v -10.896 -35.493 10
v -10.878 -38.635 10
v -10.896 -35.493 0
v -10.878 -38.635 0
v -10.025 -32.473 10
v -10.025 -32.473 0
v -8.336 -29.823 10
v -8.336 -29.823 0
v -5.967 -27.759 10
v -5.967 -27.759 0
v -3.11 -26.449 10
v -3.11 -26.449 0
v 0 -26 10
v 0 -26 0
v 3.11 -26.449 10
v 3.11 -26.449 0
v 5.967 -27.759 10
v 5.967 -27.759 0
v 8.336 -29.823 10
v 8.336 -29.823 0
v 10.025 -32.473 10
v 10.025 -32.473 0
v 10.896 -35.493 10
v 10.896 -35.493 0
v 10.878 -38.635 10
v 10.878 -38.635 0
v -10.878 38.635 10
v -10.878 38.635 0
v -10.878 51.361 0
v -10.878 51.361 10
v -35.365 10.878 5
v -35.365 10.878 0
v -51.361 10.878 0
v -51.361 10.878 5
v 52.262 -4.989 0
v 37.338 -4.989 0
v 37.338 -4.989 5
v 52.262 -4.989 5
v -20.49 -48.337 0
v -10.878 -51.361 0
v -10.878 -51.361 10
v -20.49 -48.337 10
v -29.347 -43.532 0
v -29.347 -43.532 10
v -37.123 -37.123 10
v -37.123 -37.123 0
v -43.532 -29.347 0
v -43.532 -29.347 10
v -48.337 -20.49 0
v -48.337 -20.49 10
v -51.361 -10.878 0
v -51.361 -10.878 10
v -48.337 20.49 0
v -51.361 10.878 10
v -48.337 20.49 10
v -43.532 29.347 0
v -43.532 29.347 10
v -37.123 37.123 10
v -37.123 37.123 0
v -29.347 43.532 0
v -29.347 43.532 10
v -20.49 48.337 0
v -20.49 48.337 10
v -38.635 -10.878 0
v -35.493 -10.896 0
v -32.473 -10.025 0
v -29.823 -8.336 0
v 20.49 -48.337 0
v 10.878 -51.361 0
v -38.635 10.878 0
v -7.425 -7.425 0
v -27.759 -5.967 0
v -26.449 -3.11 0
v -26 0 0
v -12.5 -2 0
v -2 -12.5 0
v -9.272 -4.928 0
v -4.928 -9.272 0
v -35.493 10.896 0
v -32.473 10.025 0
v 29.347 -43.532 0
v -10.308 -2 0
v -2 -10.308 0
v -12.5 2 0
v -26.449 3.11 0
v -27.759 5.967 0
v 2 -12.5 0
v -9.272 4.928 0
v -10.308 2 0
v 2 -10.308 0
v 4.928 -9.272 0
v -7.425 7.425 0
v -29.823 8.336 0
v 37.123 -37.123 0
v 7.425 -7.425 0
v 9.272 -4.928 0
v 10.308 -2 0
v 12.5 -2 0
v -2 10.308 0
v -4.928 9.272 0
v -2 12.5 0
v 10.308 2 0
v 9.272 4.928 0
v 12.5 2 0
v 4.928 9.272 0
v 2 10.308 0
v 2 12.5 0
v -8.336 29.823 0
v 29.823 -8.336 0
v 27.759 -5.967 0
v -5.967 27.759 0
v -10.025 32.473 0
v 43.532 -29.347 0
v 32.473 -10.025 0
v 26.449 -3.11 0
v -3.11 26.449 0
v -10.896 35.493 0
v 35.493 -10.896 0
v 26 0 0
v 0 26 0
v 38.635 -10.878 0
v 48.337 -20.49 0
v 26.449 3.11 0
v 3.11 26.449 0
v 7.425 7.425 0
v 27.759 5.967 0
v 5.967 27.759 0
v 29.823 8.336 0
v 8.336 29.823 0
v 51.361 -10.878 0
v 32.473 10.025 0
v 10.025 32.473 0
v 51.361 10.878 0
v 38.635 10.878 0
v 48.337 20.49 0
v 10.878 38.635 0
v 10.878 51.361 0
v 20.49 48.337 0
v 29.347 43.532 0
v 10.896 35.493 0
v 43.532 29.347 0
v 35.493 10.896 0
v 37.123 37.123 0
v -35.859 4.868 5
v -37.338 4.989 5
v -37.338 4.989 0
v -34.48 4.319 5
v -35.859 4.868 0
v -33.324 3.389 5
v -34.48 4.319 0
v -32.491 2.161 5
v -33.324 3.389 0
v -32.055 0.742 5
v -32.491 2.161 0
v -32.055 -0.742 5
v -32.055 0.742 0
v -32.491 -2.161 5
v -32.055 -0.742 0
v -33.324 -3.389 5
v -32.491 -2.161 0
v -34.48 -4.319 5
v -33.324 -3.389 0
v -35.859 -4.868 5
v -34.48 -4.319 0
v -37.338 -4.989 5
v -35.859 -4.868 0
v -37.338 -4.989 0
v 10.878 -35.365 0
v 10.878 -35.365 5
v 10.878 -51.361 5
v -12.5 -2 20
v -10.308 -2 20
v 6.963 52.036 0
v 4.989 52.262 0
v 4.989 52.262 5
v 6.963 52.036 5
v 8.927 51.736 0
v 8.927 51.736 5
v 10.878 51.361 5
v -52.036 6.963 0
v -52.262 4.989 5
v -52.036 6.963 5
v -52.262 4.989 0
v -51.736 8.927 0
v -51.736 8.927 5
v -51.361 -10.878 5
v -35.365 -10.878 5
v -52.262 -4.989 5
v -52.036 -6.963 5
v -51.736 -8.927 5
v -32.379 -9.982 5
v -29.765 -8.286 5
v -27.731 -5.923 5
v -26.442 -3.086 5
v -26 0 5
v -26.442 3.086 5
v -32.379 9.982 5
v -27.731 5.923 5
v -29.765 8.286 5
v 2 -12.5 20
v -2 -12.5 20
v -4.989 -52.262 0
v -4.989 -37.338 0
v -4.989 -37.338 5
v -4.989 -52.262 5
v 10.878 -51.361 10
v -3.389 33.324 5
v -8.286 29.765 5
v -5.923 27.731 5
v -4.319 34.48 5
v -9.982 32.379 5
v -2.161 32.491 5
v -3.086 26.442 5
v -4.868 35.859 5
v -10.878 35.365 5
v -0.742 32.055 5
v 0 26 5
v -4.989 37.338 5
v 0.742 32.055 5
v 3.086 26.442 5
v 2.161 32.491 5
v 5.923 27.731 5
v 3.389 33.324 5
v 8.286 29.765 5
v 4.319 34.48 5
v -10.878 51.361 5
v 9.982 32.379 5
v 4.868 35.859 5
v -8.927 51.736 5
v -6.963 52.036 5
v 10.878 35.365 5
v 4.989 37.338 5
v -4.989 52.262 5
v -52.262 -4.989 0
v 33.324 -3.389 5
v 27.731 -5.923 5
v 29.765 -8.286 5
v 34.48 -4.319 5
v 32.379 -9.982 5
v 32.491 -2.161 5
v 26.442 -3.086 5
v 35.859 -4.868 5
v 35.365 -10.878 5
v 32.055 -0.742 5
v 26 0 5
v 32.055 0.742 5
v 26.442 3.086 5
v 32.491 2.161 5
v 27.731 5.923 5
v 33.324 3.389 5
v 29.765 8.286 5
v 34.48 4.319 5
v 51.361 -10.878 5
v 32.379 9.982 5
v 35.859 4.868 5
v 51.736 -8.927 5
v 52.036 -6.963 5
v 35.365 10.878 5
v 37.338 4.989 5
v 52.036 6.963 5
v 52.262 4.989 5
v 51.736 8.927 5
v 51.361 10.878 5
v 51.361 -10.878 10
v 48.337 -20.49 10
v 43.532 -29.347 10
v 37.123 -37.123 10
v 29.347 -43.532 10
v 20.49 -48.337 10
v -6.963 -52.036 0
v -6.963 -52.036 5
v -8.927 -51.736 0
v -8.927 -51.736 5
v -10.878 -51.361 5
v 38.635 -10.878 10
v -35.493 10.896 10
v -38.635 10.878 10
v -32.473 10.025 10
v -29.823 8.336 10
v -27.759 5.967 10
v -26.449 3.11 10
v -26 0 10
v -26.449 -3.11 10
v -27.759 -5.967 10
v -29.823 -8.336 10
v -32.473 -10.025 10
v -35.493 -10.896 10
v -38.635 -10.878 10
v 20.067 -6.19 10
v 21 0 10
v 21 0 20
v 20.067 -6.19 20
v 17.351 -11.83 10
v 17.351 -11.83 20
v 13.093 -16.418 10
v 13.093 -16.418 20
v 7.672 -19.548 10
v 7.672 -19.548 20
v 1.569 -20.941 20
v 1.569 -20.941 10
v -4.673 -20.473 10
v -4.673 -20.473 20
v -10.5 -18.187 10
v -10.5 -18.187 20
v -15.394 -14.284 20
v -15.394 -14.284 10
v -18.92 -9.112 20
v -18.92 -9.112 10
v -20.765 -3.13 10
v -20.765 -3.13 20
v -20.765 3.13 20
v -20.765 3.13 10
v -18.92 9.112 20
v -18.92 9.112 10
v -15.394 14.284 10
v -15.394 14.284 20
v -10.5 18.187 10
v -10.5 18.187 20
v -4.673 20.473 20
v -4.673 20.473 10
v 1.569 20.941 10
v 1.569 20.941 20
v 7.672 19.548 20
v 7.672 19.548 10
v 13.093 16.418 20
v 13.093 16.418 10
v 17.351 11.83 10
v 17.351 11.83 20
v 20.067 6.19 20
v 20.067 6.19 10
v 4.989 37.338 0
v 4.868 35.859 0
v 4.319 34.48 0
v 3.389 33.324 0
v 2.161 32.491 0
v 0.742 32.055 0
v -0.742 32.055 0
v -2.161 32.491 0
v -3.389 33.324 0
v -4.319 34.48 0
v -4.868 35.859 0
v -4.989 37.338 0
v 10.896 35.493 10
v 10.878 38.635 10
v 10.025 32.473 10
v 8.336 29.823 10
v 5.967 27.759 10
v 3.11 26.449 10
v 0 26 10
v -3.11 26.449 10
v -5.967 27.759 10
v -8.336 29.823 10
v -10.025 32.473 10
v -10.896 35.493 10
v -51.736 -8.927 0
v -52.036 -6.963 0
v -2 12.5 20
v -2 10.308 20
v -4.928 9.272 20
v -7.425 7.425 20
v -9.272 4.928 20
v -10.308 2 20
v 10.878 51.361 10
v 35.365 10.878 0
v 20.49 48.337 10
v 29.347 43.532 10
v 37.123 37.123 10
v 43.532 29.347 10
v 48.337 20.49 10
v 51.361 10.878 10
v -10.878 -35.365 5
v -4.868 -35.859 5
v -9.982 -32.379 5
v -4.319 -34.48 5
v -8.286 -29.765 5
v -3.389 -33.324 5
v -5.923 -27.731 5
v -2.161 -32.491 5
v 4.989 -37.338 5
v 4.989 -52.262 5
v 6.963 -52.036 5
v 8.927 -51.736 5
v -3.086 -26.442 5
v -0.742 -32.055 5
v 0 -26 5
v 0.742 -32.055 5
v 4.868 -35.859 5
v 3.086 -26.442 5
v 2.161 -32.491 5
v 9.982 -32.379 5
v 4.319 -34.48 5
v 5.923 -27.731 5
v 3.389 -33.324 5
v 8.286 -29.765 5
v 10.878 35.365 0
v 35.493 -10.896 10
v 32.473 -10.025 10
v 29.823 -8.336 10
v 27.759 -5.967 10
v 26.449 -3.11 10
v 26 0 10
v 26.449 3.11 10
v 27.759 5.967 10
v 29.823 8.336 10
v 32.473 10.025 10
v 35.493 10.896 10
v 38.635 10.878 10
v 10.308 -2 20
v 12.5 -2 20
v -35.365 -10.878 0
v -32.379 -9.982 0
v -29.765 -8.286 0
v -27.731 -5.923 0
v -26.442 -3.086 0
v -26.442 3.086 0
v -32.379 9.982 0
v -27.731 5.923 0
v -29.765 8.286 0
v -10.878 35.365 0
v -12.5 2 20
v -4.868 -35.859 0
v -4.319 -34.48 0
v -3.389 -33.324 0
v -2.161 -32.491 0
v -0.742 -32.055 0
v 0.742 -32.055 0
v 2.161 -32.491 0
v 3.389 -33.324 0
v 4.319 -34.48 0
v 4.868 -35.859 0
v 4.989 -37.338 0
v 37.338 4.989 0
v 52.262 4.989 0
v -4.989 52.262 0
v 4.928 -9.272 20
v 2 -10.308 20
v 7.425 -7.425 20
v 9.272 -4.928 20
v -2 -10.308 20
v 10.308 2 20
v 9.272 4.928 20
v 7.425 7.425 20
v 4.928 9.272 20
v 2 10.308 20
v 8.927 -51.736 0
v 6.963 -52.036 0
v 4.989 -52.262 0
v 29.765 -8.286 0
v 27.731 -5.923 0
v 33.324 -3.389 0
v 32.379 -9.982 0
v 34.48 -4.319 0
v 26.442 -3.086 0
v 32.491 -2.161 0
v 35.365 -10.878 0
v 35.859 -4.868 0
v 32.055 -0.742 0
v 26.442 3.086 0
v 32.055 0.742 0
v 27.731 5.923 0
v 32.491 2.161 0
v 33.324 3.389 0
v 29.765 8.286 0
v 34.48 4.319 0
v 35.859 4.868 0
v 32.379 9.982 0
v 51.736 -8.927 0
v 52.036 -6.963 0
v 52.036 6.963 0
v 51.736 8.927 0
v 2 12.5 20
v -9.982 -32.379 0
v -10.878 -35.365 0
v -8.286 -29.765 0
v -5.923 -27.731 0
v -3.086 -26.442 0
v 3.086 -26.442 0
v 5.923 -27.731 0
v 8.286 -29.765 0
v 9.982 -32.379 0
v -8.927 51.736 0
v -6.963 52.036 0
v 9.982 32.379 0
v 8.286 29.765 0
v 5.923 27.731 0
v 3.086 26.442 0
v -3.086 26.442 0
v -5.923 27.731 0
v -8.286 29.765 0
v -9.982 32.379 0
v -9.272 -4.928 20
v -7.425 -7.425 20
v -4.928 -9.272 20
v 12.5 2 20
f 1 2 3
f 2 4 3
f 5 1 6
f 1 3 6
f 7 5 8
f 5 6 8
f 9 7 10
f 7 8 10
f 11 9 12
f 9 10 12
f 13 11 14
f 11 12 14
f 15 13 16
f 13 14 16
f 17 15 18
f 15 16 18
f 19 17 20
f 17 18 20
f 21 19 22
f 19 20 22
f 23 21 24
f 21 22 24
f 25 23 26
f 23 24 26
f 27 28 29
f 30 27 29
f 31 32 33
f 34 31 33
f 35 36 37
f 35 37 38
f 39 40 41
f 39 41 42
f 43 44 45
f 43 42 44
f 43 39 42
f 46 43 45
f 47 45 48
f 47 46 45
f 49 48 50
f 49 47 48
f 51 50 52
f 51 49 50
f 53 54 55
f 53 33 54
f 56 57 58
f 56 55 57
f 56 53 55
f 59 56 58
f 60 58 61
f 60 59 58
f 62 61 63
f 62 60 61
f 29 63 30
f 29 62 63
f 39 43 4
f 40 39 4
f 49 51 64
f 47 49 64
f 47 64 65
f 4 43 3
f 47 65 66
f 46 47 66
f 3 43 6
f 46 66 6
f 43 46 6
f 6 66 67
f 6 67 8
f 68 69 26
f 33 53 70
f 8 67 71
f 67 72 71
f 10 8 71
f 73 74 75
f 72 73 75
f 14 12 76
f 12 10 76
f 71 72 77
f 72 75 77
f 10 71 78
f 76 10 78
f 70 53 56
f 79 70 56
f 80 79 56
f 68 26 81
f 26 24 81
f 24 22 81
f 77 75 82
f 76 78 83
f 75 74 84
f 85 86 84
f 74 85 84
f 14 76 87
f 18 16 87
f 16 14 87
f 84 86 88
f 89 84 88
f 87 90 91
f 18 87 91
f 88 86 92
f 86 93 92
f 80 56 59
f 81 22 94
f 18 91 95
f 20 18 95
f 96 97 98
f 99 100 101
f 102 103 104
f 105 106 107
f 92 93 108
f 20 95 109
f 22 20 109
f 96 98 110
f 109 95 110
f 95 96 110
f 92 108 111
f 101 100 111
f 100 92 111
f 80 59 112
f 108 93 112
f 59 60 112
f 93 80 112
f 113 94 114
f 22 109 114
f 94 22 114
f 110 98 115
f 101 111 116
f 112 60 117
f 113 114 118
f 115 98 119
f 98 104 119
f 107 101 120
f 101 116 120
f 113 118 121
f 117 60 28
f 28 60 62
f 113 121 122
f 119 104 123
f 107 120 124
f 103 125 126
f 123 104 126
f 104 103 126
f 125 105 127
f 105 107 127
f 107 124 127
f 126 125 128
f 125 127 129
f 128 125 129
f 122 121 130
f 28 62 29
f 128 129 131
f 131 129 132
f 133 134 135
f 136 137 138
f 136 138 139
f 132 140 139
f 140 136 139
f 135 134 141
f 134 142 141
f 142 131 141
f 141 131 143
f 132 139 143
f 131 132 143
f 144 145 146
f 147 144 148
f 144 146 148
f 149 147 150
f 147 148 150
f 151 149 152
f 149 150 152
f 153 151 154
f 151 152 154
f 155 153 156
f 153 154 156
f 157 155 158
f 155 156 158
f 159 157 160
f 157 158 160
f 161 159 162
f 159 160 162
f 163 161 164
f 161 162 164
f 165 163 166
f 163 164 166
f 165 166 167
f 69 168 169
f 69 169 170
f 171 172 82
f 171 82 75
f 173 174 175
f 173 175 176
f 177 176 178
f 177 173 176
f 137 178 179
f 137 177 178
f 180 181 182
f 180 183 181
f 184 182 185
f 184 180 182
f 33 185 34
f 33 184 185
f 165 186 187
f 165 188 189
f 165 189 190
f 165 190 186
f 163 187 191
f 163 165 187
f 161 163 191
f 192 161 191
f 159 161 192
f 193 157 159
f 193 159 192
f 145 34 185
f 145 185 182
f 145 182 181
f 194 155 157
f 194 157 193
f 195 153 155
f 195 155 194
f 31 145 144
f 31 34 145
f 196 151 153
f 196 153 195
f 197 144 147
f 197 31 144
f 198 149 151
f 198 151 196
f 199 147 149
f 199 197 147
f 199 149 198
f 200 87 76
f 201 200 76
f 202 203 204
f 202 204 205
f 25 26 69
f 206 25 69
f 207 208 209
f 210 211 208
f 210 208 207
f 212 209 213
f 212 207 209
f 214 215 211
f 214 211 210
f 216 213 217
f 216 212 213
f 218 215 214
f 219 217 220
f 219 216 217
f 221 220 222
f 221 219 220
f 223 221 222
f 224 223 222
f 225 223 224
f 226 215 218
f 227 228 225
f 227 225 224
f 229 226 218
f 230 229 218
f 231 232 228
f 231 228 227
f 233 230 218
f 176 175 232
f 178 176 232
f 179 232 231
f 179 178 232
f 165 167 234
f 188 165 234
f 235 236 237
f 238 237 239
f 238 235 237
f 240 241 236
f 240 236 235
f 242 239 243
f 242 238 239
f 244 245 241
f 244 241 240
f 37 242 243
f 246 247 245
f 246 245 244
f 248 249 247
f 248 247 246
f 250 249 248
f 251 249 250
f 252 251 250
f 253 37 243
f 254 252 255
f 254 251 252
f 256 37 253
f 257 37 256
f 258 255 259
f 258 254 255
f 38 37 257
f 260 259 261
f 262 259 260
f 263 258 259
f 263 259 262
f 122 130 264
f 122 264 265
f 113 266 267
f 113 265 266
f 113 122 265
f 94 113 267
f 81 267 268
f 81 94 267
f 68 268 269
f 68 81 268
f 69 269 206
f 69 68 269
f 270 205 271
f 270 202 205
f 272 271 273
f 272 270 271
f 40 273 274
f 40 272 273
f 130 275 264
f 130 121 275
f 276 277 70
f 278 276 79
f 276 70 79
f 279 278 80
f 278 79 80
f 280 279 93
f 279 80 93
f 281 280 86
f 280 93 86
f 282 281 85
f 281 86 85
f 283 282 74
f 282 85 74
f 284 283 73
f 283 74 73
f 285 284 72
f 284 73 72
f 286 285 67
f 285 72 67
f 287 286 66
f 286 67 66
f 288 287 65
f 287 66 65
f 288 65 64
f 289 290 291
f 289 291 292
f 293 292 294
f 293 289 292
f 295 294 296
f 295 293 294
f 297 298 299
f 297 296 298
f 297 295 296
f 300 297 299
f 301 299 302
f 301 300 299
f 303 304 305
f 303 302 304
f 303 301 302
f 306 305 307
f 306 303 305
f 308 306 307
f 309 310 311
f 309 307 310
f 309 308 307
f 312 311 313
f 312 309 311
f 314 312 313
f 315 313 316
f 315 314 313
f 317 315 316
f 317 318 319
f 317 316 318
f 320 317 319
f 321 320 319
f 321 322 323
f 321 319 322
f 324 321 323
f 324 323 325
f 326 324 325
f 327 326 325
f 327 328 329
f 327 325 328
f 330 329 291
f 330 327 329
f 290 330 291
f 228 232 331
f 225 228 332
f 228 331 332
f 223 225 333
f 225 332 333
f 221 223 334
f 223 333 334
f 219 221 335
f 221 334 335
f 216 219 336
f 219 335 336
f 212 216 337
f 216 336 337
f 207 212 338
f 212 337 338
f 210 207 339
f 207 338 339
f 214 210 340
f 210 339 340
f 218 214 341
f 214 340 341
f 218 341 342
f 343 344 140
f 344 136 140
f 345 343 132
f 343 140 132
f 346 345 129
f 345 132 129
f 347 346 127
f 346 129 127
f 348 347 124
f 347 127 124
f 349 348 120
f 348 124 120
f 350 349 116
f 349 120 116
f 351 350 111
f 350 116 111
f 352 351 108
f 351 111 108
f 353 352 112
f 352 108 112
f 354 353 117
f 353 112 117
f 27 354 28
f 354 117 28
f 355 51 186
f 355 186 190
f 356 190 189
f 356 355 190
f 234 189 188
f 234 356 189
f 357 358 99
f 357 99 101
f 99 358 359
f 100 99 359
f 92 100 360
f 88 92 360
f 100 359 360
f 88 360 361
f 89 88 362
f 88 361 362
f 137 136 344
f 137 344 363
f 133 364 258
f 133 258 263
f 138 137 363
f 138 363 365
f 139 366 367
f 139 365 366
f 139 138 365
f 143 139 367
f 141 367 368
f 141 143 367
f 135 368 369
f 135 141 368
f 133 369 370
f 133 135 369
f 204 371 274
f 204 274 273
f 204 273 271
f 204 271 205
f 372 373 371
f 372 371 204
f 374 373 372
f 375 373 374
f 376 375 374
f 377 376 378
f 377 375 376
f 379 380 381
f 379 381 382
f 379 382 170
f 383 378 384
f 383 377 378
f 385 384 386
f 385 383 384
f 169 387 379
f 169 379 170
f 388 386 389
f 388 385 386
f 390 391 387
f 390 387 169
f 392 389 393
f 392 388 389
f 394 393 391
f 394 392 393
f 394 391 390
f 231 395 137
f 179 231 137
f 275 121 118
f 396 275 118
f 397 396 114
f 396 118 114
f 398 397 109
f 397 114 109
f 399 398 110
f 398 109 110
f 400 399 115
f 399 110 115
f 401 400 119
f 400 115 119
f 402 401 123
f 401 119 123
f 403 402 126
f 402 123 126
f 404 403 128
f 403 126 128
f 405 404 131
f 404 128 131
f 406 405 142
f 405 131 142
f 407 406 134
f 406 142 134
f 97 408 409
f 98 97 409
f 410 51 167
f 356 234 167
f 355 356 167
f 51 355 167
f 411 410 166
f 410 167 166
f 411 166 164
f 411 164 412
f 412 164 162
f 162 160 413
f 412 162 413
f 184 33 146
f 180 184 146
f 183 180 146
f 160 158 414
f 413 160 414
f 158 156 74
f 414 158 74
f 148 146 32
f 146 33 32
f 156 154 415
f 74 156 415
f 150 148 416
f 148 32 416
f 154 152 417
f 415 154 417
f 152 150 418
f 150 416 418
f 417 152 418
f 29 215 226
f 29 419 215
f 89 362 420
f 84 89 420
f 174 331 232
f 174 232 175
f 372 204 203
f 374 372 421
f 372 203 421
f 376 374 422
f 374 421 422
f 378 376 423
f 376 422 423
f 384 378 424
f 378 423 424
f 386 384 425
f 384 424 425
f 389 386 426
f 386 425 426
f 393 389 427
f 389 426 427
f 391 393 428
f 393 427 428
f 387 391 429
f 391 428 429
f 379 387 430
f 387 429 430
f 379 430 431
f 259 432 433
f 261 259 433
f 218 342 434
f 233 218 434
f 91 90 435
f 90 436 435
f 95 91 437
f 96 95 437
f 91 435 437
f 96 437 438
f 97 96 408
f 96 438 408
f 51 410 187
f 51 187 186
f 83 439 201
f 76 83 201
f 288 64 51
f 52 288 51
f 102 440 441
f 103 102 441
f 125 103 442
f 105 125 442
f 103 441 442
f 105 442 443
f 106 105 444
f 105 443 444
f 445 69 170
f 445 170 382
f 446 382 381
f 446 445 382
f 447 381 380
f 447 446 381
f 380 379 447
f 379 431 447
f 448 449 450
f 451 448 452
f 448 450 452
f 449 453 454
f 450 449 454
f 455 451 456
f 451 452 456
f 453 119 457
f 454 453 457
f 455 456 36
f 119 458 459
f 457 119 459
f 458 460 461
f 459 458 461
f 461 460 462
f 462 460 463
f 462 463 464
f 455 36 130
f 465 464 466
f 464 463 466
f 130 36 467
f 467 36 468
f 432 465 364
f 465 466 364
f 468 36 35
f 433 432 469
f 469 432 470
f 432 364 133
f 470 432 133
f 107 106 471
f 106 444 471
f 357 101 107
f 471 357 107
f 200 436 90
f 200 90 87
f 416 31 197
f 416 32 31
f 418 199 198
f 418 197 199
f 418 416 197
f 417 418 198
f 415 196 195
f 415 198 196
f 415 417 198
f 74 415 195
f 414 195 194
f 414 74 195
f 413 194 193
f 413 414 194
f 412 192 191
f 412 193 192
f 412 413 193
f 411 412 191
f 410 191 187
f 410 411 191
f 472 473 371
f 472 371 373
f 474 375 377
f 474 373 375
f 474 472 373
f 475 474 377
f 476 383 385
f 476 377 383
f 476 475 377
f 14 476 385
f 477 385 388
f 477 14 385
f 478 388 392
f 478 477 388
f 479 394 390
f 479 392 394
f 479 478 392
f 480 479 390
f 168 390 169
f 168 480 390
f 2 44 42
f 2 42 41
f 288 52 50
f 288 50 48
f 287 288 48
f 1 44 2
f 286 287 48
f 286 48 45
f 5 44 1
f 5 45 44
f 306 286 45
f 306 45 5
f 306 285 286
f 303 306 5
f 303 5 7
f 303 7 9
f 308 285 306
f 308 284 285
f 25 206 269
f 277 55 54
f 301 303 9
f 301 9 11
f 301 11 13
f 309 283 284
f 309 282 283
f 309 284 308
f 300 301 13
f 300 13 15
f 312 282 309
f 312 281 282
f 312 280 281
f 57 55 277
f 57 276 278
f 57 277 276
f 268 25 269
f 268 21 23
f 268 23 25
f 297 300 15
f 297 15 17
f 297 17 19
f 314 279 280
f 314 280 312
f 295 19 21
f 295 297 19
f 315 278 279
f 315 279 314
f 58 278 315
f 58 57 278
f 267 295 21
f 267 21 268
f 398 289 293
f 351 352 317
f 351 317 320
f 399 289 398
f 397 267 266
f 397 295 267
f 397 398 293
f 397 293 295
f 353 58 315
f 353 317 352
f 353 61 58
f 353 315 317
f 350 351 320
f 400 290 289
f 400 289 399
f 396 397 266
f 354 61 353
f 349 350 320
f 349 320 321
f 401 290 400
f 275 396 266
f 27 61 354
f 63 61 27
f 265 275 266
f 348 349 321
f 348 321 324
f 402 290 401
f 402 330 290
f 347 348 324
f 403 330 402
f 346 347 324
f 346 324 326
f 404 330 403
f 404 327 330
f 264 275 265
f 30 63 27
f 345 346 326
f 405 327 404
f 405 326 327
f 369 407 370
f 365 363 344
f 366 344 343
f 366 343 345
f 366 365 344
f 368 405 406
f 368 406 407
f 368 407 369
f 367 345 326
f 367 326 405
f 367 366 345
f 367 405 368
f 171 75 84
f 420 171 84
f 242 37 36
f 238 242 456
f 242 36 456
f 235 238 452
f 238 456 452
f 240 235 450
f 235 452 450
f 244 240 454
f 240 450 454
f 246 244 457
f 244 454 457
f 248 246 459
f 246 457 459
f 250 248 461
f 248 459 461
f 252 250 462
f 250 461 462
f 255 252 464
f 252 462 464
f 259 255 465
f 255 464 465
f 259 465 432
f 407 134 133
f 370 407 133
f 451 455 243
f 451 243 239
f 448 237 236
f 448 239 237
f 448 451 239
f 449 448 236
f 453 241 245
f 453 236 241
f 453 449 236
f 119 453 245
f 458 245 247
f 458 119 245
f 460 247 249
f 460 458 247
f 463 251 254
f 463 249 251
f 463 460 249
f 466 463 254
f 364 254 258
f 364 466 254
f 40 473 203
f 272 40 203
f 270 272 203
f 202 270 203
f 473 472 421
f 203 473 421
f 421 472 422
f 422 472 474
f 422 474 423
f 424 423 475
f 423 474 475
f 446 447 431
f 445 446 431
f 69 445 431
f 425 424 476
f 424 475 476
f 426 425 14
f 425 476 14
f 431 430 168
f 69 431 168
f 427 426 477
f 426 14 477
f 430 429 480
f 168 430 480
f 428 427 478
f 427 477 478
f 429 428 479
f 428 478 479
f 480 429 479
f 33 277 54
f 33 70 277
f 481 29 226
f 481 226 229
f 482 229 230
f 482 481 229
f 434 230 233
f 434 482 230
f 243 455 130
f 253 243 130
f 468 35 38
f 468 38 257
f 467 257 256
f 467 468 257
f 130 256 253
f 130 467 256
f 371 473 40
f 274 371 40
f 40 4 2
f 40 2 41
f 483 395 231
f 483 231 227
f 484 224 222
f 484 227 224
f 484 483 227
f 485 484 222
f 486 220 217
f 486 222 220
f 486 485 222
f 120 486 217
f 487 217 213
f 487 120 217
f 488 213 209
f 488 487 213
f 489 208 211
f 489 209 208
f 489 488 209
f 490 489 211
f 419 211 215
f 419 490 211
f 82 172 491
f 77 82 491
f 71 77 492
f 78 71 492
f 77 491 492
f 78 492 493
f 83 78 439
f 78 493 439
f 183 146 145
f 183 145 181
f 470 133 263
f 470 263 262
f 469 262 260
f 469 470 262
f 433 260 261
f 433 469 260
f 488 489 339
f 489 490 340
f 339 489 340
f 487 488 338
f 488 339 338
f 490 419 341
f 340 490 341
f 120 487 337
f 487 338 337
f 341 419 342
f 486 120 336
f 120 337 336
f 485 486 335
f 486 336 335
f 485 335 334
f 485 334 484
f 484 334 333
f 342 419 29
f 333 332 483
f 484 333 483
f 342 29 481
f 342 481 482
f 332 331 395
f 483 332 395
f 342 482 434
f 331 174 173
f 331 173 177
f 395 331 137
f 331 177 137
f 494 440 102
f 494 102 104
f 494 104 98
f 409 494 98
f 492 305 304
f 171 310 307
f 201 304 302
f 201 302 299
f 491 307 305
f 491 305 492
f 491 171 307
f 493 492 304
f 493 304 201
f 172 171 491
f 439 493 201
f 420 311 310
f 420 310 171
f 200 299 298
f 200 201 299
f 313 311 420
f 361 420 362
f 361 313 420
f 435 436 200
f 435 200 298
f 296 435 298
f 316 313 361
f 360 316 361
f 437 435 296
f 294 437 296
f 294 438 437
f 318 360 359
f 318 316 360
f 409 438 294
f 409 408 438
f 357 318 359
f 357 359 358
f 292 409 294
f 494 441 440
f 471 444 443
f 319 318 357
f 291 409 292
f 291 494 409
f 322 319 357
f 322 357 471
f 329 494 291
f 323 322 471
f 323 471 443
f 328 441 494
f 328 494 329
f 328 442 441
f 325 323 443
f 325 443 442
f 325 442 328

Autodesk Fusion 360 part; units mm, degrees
sketch "Sketch8" plane through (0, 0, 0) normal (0, 0, 1) x (1, 0, 0)
  line L0 (0, 0) -> (0, 52.5) construction
  line L1 (0, 0) -> (0, -52.5) construction
  line L2 (0, 0) -> (52.5, 0) construction
  line L3 (0, 0) -> (-52.5, 0) construction
  line L4 (-35.3649, 10.8778) -> (-51.3607, 10.8778)
  line L5 (-35.3649, -10.8778) -> (-51.3607, -10.8778)
  line L6 (10.8778, 35.3649) -> (10.8778, 51.3607)
  line L7 (-10.8778, 35.3649) -> (-10.8778, 51.3607)
  line L8 (35.3649, 10.8778) -> (51.3607, 10.8778)
  line L9 (35.3649, -10.8778) -> (51.3607, -10.8778)
  line L10 (10.8778, -35.3649) -> (10.8778, -51.3607)
  line L11 (-10.8778, -35.3649) -> (-10.8778, -51.3607)
  line L12 (-4.9886, 36.6622) -> (-4.9886, 52.2625)
  line L13 (4.9886, 36.6622) -> (4.9886, 52.2625)
  line L14 (36.6622, 4.9886) -> (52.2625, 4.9886)
  line L15 (36.6622, -4.9886) -> (52.2625, -4.9886)
  line L16 (-4.9886, -36.6622) -> (-4.9886, -52.2625)
  line L17 (4.9886, -36.6622) -> (4.9886, -52.2625)
  line L18 (-36.6622, 4.9886) -> (-52.2625, 4.9886)
  line L19 (-36.6622, -4.9886) -> (-52.2625, -4.9886)
  arc A0 (-4.9886, 37.3378) -> (4.9886, 37.3378) centre (0, 37) ccw
  arc A1 (-10.8778, 38.6351) -> (10.8778, 38.6351) centre (0, 37) ccw
  arc A2 (35.3649, 10.8778) -> (36.6622, 4.9886) centre (0, 0) ccw construction
  arc A3 (38.6351, 10.8778) -> (38.6351, -10.8778) centre (37, 0) ccw
  arc A4 (37.3378, 4.9886) -> (37.3378, -4.9886) centre (37, 0) ccw
  arc A5 (10.8778, -38.6351) -> (-10.8778, -38.6351) centre (0, -37) ccw
  arc A6 (4.9886, -37.3378) -> (-4.9886, -37.3378) centre (0, -37) ccw
  arc A7 (-38.6351, -10.8778) -> (-38.6351, 10.8778) centre (-37, 0) ccw
  arc A8 (-37.3378, -4.9886) -> (-37.3378, 4.9886) centre (-37, 0) ccw
  arc A9 (-4.9886, 52.2625) -> (-52.2625, 4.9886) centre (0, 0) ccw
  arc A10 (52.2625, 4.9886) -> (4.9886, 52.2625) centre (0, 0) ccw
  arc A11 (-52.2625, -4.9886) -> (-4.9886, -52.2625) centre (0, 0) ccw
  arc A12 (4.9886, -52.2625) -> (52.2625, -4.9886) centre (0, 0) ccw
  dimension "d65" = 105
  dimension "d66" = 74
  dimension "d67" = 22
  dimension "d68" = 10
extrude "Extrude9" add sketch "Sketch8" along normal blind 10 contours L4 L5 L6 L7 L8 L9 L10 L11 A1 A3 A5 A7 A9 A10 A11 A12 makes body 1
extrude "Extrude10" add sketch "Sketch8" along normal blind 5 separate body contours L4 L5 L18 L19 A7 A8 A9 A11 | L6 L7 L12 L13 A0 A1 A9 A10 | L10 L11 L16 L17 A5 A6 A11 A12 | L8 L9 L14 L15 A3 A4 A10 A12 makes body 2 at (41.3545, 8.9147, 0) makes body 3 at (8.9147, -41.3545, 0) makes body 4 at (-8.9147, 41.3545, 5) makes body 5 at (-41.3545, -8.9147, 0)
sketch "Sketch13" plane through (0, 0, 10) normal (0, 0, 1) x (1, 0, 0)
  circle A0 centre (0, 0) radius 21
  line L0 (2, -12.5) -> (-2, -12.5)
  line L1 (0, 0) -> (0, -12.5) construction
  line L2 (2, -10.3078) -> (2, -12.5)
  line L3 (-2, -10.3078) -> (-2, -12.5)
  line L4 (12.5, 2) -> (12.5, -2)
  line L5 (10.3078, 2) -> (12.5, 2)
  line L6 (10.3078, -2) -> (12.5, -2)
  line L7 (-2, 12.5) -> (2, 12.5)
  line L8 (-2, 10.3078) -> (-2, 12.5)
  line L9 (2, 10.3078) -> (2, 12.5)
  line L10 (-12.5, -2) -> (-12.5, 2)
  line L11 (-10.3078, -2) -> (-12.5, -2)
  line L12 (-10.3078, 2) -> (-12.5, 2)
  arc A1 (-10.3078, -2) -> (-2, -10.3078) centre (0, 0) ccw
  arc A2 (2, -10.3078) -> (10.3078, -2) centre (0, 0) ccw
  arc A3 (10.3078, 2) -> (2, 10.3078) centre (0, 0) ccw
  arc A4 (-2, 10.3078) -> (-10.3078, 2) centre (0, 0) ccw
  arc A5 (10.8778, -38.6351) -> (-10.8778, -38.6351) centre (0, -37) ccw
  line L13 (10.8778, -38.6351) -> (10.8778, -51.3607)
  arc A6 (10.8778, -51.3607) -> (51.3607, -10.8778) centre (0, 0) ccw
  line L14 (51.3607, -10.8778) -> (38.6351, -10.8778)
  arc A7 (38.6351, 10.8778) -> (38.6351, -10.8778) centre (37, 0) ccw
  line L15 (38.6351, 10.8778) -> (51.3607, 10.8778)
  arc A8 (51.3607, 10.8778) -> (10.8778, 51.3607) centre (0, 0) ccw
  line L16 (10.8778, 51.3607) -> (10.8778, 38.6351)
  arc A9 (-10.8778, 38.6351) -> (10.8778, 38.6351) centre (0, 37) ccw
  line L17 (-10.8778, 38.6351) -> (-10.8778, 51.3607)
  arc A10 (-10.8778, 51.3607) -> (-51.3607, 10.8778) centre (0, 0) ccw
  line L18 (-51.3607, 10.8778) -> (-38.6351, 10.8778)
  arc A11 (-38.6351, -10.8778) -> (-38.6351, 10.8778) centre (-37, 0) ccw
  line L19 (-38.6351, -10.8778) -> (-51.3607, -10.8778)
  arc A12 (-51.3607, -10.8778) -> (-10.8778, -51.3607) centre (0, 0) ccw
  line L20 (-10.8778, -51.3607) -> (-10.8778, -38.6351)
  dimension "d83" = 42
  dimension "d84" = 21
  dimension "d90" = 360
  dimension "d95" = 4
  dimension "d97" = 2
extrude "Extrude11" add sketch "Sketch13" along normal blind 10 contours A0 bodies 1
extrude "Extrude12" cut sketch "Sketch13" against normal blind 15 contours L0 L2 L3 L4 L5 L6 L7 L8 L9 L10 L11 L12 A1 A2 A3 A4 bodies 1
